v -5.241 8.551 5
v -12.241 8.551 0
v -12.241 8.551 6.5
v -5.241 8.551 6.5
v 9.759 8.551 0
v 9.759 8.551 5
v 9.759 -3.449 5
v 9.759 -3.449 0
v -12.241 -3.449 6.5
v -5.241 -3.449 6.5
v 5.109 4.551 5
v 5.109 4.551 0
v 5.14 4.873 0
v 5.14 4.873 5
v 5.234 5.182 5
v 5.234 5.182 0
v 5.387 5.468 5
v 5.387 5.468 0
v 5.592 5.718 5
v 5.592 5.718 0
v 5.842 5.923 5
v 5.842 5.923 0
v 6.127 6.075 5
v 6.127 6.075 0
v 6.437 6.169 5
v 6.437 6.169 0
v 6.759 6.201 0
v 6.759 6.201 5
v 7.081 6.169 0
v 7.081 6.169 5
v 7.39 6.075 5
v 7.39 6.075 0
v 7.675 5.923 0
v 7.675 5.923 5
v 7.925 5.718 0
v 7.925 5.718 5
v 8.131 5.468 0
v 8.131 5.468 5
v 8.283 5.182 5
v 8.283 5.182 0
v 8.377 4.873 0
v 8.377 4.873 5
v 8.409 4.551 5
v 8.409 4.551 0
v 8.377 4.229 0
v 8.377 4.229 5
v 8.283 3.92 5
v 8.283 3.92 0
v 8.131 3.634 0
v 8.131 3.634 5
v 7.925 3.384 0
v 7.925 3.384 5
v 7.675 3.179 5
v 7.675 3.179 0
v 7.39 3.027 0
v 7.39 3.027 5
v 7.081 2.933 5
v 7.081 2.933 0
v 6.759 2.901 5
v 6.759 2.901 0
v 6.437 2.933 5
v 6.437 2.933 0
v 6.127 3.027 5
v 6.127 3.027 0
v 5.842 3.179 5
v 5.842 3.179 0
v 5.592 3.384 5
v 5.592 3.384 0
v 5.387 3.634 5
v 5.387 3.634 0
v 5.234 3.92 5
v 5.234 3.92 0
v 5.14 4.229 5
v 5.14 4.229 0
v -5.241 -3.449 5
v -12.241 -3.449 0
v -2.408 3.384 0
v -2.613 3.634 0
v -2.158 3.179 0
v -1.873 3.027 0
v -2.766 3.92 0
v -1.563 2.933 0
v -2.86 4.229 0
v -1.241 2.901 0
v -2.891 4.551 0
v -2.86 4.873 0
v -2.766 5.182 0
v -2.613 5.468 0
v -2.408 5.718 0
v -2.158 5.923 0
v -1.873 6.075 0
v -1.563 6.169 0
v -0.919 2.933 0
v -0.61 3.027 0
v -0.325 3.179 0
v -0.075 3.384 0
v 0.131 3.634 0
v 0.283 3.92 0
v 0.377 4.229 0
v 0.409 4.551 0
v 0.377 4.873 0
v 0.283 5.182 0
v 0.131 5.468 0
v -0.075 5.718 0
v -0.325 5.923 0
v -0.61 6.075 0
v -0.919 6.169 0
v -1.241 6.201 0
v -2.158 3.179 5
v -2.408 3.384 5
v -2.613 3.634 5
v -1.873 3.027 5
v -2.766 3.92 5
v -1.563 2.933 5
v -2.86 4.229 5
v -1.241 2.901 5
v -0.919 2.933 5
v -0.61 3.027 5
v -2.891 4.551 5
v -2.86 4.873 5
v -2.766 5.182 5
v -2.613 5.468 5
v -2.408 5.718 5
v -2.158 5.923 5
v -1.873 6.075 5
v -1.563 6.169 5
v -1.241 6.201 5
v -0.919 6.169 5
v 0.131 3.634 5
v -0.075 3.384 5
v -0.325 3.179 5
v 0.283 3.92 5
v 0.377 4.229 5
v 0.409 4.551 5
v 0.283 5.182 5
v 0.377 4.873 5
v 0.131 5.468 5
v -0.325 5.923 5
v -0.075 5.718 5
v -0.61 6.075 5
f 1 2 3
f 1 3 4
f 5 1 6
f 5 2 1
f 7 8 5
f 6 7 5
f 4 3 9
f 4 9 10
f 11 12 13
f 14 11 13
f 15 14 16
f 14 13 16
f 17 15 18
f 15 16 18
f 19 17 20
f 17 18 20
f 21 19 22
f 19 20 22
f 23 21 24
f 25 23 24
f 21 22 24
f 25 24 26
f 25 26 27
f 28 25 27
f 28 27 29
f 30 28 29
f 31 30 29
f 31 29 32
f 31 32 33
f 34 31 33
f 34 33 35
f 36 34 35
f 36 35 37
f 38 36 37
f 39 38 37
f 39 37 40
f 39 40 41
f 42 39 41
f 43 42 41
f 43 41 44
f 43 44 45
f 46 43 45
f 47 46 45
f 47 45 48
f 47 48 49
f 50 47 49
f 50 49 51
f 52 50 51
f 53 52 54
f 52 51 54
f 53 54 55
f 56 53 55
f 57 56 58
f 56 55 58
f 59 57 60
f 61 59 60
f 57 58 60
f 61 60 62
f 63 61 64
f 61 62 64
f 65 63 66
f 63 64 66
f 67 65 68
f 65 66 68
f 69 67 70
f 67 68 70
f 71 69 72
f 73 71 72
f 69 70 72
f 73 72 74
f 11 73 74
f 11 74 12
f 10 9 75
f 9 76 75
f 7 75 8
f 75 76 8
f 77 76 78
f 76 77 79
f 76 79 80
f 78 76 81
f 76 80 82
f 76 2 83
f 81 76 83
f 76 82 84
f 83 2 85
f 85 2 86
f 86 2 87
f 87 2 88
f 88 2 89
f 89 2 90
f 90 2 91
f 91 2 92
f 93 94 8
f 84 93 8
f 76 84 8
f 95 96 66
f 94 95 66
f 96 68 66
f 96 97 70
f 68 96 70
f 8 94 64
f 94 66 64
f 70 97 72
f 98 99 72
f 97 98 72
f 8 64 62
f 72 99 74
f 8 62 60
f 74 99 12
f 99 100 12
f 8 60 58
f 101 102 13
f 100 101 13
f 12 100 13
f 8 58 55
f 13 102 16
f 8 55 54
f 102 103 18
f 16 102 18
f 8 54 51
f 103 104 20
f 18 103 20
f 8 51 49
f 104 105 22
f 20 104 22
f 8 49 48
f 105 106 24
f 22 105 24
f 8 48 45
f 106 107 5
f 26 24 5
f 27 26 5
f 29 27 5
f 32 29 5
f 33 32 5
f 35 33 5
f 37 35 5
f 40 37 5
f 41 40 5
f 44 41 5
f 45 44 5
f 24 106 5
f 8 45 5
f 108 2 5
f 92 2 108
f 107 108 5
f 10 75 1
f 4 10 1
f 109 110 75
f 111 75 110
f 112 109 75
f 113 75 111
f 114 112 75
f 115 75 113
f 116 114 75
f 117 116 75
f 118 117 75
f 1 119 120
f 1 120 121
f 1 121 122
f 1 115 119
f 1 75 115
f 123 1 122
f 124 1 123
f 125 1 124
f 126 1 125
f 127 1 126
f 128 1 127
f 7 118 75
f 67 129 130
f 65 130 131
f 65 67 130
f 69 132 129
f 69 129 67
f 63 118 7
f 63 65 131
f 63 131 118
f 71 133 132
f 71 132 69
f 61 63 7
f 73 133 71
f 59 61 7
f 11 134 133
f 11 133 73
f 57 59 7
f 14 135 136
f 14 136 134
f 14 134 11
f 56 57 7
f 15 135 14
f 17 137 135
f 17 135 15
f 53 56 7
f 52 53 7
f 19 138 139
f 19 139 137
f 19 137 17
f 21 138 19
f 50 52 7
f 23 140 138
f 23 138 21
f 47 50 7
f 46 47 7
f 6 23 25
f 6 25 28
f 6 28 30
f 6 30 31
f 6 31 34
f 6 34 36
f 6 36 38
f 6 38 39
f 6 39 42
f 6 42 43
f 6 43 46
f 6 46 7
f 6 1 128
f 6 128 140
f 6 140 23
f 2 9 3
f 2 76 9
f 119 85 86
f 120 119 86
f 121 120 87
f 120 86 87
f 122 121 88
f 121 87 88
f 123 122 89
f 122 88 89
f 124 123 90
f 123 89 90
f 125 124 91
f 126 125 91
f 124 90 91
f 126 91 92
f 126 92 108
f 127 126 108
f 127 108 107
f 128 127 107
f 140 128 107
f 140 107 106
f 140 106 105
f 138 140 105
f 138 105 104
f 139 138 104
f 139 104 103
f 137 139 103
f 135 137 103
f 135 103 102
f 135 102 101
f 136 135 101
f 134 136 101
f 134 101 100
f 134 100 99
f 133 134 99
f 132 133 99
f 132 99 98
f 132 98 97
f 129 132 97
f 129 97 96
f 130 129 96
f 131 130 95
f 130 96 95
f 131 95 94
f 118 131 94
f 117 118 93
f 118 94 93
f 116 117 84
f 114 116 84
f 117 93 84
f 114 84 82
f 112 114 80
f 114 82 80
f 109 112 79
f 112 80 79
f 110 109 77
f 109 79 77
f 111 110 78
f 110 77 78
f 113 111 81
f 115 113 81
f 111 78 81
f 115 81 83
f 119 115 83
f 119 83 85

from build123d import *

# Parameters (mm, degrees)
F0_W     = 22
F0_H     = 12
F1_DEPTH = 5
F2_W     = 7
F2_H     = 12
F3_DEPTH = 1.5
F5_D     = 3.3


with BuildPart() as f1:
    # F0 (on Top) → F1 (new body)
    with BuildSketch(Plane.XY):
        with Locations((-1.241267357, 2.5510253936)):
            Rectangle(F0_W, F0_H)
    extrude(amount=F1_DEPTH)

    # F2 (on face) → F3 (join)
    with BuildSketch(Plane.XY.offset(5)):
        with Locations((-8.741267357, 2.5510253936)):
            Rectangle(F2_W, F2_H)
    extrude(amount=F3_DEPTH)

    # F5 (through all)
    with Locations(Plane.XY.offset(5)):
        with Locations((-1.241267357, 4.5510253936), (6.758732643, 4.5510253936)):
            Hole(F5_D / 2)


solid = f1.part
